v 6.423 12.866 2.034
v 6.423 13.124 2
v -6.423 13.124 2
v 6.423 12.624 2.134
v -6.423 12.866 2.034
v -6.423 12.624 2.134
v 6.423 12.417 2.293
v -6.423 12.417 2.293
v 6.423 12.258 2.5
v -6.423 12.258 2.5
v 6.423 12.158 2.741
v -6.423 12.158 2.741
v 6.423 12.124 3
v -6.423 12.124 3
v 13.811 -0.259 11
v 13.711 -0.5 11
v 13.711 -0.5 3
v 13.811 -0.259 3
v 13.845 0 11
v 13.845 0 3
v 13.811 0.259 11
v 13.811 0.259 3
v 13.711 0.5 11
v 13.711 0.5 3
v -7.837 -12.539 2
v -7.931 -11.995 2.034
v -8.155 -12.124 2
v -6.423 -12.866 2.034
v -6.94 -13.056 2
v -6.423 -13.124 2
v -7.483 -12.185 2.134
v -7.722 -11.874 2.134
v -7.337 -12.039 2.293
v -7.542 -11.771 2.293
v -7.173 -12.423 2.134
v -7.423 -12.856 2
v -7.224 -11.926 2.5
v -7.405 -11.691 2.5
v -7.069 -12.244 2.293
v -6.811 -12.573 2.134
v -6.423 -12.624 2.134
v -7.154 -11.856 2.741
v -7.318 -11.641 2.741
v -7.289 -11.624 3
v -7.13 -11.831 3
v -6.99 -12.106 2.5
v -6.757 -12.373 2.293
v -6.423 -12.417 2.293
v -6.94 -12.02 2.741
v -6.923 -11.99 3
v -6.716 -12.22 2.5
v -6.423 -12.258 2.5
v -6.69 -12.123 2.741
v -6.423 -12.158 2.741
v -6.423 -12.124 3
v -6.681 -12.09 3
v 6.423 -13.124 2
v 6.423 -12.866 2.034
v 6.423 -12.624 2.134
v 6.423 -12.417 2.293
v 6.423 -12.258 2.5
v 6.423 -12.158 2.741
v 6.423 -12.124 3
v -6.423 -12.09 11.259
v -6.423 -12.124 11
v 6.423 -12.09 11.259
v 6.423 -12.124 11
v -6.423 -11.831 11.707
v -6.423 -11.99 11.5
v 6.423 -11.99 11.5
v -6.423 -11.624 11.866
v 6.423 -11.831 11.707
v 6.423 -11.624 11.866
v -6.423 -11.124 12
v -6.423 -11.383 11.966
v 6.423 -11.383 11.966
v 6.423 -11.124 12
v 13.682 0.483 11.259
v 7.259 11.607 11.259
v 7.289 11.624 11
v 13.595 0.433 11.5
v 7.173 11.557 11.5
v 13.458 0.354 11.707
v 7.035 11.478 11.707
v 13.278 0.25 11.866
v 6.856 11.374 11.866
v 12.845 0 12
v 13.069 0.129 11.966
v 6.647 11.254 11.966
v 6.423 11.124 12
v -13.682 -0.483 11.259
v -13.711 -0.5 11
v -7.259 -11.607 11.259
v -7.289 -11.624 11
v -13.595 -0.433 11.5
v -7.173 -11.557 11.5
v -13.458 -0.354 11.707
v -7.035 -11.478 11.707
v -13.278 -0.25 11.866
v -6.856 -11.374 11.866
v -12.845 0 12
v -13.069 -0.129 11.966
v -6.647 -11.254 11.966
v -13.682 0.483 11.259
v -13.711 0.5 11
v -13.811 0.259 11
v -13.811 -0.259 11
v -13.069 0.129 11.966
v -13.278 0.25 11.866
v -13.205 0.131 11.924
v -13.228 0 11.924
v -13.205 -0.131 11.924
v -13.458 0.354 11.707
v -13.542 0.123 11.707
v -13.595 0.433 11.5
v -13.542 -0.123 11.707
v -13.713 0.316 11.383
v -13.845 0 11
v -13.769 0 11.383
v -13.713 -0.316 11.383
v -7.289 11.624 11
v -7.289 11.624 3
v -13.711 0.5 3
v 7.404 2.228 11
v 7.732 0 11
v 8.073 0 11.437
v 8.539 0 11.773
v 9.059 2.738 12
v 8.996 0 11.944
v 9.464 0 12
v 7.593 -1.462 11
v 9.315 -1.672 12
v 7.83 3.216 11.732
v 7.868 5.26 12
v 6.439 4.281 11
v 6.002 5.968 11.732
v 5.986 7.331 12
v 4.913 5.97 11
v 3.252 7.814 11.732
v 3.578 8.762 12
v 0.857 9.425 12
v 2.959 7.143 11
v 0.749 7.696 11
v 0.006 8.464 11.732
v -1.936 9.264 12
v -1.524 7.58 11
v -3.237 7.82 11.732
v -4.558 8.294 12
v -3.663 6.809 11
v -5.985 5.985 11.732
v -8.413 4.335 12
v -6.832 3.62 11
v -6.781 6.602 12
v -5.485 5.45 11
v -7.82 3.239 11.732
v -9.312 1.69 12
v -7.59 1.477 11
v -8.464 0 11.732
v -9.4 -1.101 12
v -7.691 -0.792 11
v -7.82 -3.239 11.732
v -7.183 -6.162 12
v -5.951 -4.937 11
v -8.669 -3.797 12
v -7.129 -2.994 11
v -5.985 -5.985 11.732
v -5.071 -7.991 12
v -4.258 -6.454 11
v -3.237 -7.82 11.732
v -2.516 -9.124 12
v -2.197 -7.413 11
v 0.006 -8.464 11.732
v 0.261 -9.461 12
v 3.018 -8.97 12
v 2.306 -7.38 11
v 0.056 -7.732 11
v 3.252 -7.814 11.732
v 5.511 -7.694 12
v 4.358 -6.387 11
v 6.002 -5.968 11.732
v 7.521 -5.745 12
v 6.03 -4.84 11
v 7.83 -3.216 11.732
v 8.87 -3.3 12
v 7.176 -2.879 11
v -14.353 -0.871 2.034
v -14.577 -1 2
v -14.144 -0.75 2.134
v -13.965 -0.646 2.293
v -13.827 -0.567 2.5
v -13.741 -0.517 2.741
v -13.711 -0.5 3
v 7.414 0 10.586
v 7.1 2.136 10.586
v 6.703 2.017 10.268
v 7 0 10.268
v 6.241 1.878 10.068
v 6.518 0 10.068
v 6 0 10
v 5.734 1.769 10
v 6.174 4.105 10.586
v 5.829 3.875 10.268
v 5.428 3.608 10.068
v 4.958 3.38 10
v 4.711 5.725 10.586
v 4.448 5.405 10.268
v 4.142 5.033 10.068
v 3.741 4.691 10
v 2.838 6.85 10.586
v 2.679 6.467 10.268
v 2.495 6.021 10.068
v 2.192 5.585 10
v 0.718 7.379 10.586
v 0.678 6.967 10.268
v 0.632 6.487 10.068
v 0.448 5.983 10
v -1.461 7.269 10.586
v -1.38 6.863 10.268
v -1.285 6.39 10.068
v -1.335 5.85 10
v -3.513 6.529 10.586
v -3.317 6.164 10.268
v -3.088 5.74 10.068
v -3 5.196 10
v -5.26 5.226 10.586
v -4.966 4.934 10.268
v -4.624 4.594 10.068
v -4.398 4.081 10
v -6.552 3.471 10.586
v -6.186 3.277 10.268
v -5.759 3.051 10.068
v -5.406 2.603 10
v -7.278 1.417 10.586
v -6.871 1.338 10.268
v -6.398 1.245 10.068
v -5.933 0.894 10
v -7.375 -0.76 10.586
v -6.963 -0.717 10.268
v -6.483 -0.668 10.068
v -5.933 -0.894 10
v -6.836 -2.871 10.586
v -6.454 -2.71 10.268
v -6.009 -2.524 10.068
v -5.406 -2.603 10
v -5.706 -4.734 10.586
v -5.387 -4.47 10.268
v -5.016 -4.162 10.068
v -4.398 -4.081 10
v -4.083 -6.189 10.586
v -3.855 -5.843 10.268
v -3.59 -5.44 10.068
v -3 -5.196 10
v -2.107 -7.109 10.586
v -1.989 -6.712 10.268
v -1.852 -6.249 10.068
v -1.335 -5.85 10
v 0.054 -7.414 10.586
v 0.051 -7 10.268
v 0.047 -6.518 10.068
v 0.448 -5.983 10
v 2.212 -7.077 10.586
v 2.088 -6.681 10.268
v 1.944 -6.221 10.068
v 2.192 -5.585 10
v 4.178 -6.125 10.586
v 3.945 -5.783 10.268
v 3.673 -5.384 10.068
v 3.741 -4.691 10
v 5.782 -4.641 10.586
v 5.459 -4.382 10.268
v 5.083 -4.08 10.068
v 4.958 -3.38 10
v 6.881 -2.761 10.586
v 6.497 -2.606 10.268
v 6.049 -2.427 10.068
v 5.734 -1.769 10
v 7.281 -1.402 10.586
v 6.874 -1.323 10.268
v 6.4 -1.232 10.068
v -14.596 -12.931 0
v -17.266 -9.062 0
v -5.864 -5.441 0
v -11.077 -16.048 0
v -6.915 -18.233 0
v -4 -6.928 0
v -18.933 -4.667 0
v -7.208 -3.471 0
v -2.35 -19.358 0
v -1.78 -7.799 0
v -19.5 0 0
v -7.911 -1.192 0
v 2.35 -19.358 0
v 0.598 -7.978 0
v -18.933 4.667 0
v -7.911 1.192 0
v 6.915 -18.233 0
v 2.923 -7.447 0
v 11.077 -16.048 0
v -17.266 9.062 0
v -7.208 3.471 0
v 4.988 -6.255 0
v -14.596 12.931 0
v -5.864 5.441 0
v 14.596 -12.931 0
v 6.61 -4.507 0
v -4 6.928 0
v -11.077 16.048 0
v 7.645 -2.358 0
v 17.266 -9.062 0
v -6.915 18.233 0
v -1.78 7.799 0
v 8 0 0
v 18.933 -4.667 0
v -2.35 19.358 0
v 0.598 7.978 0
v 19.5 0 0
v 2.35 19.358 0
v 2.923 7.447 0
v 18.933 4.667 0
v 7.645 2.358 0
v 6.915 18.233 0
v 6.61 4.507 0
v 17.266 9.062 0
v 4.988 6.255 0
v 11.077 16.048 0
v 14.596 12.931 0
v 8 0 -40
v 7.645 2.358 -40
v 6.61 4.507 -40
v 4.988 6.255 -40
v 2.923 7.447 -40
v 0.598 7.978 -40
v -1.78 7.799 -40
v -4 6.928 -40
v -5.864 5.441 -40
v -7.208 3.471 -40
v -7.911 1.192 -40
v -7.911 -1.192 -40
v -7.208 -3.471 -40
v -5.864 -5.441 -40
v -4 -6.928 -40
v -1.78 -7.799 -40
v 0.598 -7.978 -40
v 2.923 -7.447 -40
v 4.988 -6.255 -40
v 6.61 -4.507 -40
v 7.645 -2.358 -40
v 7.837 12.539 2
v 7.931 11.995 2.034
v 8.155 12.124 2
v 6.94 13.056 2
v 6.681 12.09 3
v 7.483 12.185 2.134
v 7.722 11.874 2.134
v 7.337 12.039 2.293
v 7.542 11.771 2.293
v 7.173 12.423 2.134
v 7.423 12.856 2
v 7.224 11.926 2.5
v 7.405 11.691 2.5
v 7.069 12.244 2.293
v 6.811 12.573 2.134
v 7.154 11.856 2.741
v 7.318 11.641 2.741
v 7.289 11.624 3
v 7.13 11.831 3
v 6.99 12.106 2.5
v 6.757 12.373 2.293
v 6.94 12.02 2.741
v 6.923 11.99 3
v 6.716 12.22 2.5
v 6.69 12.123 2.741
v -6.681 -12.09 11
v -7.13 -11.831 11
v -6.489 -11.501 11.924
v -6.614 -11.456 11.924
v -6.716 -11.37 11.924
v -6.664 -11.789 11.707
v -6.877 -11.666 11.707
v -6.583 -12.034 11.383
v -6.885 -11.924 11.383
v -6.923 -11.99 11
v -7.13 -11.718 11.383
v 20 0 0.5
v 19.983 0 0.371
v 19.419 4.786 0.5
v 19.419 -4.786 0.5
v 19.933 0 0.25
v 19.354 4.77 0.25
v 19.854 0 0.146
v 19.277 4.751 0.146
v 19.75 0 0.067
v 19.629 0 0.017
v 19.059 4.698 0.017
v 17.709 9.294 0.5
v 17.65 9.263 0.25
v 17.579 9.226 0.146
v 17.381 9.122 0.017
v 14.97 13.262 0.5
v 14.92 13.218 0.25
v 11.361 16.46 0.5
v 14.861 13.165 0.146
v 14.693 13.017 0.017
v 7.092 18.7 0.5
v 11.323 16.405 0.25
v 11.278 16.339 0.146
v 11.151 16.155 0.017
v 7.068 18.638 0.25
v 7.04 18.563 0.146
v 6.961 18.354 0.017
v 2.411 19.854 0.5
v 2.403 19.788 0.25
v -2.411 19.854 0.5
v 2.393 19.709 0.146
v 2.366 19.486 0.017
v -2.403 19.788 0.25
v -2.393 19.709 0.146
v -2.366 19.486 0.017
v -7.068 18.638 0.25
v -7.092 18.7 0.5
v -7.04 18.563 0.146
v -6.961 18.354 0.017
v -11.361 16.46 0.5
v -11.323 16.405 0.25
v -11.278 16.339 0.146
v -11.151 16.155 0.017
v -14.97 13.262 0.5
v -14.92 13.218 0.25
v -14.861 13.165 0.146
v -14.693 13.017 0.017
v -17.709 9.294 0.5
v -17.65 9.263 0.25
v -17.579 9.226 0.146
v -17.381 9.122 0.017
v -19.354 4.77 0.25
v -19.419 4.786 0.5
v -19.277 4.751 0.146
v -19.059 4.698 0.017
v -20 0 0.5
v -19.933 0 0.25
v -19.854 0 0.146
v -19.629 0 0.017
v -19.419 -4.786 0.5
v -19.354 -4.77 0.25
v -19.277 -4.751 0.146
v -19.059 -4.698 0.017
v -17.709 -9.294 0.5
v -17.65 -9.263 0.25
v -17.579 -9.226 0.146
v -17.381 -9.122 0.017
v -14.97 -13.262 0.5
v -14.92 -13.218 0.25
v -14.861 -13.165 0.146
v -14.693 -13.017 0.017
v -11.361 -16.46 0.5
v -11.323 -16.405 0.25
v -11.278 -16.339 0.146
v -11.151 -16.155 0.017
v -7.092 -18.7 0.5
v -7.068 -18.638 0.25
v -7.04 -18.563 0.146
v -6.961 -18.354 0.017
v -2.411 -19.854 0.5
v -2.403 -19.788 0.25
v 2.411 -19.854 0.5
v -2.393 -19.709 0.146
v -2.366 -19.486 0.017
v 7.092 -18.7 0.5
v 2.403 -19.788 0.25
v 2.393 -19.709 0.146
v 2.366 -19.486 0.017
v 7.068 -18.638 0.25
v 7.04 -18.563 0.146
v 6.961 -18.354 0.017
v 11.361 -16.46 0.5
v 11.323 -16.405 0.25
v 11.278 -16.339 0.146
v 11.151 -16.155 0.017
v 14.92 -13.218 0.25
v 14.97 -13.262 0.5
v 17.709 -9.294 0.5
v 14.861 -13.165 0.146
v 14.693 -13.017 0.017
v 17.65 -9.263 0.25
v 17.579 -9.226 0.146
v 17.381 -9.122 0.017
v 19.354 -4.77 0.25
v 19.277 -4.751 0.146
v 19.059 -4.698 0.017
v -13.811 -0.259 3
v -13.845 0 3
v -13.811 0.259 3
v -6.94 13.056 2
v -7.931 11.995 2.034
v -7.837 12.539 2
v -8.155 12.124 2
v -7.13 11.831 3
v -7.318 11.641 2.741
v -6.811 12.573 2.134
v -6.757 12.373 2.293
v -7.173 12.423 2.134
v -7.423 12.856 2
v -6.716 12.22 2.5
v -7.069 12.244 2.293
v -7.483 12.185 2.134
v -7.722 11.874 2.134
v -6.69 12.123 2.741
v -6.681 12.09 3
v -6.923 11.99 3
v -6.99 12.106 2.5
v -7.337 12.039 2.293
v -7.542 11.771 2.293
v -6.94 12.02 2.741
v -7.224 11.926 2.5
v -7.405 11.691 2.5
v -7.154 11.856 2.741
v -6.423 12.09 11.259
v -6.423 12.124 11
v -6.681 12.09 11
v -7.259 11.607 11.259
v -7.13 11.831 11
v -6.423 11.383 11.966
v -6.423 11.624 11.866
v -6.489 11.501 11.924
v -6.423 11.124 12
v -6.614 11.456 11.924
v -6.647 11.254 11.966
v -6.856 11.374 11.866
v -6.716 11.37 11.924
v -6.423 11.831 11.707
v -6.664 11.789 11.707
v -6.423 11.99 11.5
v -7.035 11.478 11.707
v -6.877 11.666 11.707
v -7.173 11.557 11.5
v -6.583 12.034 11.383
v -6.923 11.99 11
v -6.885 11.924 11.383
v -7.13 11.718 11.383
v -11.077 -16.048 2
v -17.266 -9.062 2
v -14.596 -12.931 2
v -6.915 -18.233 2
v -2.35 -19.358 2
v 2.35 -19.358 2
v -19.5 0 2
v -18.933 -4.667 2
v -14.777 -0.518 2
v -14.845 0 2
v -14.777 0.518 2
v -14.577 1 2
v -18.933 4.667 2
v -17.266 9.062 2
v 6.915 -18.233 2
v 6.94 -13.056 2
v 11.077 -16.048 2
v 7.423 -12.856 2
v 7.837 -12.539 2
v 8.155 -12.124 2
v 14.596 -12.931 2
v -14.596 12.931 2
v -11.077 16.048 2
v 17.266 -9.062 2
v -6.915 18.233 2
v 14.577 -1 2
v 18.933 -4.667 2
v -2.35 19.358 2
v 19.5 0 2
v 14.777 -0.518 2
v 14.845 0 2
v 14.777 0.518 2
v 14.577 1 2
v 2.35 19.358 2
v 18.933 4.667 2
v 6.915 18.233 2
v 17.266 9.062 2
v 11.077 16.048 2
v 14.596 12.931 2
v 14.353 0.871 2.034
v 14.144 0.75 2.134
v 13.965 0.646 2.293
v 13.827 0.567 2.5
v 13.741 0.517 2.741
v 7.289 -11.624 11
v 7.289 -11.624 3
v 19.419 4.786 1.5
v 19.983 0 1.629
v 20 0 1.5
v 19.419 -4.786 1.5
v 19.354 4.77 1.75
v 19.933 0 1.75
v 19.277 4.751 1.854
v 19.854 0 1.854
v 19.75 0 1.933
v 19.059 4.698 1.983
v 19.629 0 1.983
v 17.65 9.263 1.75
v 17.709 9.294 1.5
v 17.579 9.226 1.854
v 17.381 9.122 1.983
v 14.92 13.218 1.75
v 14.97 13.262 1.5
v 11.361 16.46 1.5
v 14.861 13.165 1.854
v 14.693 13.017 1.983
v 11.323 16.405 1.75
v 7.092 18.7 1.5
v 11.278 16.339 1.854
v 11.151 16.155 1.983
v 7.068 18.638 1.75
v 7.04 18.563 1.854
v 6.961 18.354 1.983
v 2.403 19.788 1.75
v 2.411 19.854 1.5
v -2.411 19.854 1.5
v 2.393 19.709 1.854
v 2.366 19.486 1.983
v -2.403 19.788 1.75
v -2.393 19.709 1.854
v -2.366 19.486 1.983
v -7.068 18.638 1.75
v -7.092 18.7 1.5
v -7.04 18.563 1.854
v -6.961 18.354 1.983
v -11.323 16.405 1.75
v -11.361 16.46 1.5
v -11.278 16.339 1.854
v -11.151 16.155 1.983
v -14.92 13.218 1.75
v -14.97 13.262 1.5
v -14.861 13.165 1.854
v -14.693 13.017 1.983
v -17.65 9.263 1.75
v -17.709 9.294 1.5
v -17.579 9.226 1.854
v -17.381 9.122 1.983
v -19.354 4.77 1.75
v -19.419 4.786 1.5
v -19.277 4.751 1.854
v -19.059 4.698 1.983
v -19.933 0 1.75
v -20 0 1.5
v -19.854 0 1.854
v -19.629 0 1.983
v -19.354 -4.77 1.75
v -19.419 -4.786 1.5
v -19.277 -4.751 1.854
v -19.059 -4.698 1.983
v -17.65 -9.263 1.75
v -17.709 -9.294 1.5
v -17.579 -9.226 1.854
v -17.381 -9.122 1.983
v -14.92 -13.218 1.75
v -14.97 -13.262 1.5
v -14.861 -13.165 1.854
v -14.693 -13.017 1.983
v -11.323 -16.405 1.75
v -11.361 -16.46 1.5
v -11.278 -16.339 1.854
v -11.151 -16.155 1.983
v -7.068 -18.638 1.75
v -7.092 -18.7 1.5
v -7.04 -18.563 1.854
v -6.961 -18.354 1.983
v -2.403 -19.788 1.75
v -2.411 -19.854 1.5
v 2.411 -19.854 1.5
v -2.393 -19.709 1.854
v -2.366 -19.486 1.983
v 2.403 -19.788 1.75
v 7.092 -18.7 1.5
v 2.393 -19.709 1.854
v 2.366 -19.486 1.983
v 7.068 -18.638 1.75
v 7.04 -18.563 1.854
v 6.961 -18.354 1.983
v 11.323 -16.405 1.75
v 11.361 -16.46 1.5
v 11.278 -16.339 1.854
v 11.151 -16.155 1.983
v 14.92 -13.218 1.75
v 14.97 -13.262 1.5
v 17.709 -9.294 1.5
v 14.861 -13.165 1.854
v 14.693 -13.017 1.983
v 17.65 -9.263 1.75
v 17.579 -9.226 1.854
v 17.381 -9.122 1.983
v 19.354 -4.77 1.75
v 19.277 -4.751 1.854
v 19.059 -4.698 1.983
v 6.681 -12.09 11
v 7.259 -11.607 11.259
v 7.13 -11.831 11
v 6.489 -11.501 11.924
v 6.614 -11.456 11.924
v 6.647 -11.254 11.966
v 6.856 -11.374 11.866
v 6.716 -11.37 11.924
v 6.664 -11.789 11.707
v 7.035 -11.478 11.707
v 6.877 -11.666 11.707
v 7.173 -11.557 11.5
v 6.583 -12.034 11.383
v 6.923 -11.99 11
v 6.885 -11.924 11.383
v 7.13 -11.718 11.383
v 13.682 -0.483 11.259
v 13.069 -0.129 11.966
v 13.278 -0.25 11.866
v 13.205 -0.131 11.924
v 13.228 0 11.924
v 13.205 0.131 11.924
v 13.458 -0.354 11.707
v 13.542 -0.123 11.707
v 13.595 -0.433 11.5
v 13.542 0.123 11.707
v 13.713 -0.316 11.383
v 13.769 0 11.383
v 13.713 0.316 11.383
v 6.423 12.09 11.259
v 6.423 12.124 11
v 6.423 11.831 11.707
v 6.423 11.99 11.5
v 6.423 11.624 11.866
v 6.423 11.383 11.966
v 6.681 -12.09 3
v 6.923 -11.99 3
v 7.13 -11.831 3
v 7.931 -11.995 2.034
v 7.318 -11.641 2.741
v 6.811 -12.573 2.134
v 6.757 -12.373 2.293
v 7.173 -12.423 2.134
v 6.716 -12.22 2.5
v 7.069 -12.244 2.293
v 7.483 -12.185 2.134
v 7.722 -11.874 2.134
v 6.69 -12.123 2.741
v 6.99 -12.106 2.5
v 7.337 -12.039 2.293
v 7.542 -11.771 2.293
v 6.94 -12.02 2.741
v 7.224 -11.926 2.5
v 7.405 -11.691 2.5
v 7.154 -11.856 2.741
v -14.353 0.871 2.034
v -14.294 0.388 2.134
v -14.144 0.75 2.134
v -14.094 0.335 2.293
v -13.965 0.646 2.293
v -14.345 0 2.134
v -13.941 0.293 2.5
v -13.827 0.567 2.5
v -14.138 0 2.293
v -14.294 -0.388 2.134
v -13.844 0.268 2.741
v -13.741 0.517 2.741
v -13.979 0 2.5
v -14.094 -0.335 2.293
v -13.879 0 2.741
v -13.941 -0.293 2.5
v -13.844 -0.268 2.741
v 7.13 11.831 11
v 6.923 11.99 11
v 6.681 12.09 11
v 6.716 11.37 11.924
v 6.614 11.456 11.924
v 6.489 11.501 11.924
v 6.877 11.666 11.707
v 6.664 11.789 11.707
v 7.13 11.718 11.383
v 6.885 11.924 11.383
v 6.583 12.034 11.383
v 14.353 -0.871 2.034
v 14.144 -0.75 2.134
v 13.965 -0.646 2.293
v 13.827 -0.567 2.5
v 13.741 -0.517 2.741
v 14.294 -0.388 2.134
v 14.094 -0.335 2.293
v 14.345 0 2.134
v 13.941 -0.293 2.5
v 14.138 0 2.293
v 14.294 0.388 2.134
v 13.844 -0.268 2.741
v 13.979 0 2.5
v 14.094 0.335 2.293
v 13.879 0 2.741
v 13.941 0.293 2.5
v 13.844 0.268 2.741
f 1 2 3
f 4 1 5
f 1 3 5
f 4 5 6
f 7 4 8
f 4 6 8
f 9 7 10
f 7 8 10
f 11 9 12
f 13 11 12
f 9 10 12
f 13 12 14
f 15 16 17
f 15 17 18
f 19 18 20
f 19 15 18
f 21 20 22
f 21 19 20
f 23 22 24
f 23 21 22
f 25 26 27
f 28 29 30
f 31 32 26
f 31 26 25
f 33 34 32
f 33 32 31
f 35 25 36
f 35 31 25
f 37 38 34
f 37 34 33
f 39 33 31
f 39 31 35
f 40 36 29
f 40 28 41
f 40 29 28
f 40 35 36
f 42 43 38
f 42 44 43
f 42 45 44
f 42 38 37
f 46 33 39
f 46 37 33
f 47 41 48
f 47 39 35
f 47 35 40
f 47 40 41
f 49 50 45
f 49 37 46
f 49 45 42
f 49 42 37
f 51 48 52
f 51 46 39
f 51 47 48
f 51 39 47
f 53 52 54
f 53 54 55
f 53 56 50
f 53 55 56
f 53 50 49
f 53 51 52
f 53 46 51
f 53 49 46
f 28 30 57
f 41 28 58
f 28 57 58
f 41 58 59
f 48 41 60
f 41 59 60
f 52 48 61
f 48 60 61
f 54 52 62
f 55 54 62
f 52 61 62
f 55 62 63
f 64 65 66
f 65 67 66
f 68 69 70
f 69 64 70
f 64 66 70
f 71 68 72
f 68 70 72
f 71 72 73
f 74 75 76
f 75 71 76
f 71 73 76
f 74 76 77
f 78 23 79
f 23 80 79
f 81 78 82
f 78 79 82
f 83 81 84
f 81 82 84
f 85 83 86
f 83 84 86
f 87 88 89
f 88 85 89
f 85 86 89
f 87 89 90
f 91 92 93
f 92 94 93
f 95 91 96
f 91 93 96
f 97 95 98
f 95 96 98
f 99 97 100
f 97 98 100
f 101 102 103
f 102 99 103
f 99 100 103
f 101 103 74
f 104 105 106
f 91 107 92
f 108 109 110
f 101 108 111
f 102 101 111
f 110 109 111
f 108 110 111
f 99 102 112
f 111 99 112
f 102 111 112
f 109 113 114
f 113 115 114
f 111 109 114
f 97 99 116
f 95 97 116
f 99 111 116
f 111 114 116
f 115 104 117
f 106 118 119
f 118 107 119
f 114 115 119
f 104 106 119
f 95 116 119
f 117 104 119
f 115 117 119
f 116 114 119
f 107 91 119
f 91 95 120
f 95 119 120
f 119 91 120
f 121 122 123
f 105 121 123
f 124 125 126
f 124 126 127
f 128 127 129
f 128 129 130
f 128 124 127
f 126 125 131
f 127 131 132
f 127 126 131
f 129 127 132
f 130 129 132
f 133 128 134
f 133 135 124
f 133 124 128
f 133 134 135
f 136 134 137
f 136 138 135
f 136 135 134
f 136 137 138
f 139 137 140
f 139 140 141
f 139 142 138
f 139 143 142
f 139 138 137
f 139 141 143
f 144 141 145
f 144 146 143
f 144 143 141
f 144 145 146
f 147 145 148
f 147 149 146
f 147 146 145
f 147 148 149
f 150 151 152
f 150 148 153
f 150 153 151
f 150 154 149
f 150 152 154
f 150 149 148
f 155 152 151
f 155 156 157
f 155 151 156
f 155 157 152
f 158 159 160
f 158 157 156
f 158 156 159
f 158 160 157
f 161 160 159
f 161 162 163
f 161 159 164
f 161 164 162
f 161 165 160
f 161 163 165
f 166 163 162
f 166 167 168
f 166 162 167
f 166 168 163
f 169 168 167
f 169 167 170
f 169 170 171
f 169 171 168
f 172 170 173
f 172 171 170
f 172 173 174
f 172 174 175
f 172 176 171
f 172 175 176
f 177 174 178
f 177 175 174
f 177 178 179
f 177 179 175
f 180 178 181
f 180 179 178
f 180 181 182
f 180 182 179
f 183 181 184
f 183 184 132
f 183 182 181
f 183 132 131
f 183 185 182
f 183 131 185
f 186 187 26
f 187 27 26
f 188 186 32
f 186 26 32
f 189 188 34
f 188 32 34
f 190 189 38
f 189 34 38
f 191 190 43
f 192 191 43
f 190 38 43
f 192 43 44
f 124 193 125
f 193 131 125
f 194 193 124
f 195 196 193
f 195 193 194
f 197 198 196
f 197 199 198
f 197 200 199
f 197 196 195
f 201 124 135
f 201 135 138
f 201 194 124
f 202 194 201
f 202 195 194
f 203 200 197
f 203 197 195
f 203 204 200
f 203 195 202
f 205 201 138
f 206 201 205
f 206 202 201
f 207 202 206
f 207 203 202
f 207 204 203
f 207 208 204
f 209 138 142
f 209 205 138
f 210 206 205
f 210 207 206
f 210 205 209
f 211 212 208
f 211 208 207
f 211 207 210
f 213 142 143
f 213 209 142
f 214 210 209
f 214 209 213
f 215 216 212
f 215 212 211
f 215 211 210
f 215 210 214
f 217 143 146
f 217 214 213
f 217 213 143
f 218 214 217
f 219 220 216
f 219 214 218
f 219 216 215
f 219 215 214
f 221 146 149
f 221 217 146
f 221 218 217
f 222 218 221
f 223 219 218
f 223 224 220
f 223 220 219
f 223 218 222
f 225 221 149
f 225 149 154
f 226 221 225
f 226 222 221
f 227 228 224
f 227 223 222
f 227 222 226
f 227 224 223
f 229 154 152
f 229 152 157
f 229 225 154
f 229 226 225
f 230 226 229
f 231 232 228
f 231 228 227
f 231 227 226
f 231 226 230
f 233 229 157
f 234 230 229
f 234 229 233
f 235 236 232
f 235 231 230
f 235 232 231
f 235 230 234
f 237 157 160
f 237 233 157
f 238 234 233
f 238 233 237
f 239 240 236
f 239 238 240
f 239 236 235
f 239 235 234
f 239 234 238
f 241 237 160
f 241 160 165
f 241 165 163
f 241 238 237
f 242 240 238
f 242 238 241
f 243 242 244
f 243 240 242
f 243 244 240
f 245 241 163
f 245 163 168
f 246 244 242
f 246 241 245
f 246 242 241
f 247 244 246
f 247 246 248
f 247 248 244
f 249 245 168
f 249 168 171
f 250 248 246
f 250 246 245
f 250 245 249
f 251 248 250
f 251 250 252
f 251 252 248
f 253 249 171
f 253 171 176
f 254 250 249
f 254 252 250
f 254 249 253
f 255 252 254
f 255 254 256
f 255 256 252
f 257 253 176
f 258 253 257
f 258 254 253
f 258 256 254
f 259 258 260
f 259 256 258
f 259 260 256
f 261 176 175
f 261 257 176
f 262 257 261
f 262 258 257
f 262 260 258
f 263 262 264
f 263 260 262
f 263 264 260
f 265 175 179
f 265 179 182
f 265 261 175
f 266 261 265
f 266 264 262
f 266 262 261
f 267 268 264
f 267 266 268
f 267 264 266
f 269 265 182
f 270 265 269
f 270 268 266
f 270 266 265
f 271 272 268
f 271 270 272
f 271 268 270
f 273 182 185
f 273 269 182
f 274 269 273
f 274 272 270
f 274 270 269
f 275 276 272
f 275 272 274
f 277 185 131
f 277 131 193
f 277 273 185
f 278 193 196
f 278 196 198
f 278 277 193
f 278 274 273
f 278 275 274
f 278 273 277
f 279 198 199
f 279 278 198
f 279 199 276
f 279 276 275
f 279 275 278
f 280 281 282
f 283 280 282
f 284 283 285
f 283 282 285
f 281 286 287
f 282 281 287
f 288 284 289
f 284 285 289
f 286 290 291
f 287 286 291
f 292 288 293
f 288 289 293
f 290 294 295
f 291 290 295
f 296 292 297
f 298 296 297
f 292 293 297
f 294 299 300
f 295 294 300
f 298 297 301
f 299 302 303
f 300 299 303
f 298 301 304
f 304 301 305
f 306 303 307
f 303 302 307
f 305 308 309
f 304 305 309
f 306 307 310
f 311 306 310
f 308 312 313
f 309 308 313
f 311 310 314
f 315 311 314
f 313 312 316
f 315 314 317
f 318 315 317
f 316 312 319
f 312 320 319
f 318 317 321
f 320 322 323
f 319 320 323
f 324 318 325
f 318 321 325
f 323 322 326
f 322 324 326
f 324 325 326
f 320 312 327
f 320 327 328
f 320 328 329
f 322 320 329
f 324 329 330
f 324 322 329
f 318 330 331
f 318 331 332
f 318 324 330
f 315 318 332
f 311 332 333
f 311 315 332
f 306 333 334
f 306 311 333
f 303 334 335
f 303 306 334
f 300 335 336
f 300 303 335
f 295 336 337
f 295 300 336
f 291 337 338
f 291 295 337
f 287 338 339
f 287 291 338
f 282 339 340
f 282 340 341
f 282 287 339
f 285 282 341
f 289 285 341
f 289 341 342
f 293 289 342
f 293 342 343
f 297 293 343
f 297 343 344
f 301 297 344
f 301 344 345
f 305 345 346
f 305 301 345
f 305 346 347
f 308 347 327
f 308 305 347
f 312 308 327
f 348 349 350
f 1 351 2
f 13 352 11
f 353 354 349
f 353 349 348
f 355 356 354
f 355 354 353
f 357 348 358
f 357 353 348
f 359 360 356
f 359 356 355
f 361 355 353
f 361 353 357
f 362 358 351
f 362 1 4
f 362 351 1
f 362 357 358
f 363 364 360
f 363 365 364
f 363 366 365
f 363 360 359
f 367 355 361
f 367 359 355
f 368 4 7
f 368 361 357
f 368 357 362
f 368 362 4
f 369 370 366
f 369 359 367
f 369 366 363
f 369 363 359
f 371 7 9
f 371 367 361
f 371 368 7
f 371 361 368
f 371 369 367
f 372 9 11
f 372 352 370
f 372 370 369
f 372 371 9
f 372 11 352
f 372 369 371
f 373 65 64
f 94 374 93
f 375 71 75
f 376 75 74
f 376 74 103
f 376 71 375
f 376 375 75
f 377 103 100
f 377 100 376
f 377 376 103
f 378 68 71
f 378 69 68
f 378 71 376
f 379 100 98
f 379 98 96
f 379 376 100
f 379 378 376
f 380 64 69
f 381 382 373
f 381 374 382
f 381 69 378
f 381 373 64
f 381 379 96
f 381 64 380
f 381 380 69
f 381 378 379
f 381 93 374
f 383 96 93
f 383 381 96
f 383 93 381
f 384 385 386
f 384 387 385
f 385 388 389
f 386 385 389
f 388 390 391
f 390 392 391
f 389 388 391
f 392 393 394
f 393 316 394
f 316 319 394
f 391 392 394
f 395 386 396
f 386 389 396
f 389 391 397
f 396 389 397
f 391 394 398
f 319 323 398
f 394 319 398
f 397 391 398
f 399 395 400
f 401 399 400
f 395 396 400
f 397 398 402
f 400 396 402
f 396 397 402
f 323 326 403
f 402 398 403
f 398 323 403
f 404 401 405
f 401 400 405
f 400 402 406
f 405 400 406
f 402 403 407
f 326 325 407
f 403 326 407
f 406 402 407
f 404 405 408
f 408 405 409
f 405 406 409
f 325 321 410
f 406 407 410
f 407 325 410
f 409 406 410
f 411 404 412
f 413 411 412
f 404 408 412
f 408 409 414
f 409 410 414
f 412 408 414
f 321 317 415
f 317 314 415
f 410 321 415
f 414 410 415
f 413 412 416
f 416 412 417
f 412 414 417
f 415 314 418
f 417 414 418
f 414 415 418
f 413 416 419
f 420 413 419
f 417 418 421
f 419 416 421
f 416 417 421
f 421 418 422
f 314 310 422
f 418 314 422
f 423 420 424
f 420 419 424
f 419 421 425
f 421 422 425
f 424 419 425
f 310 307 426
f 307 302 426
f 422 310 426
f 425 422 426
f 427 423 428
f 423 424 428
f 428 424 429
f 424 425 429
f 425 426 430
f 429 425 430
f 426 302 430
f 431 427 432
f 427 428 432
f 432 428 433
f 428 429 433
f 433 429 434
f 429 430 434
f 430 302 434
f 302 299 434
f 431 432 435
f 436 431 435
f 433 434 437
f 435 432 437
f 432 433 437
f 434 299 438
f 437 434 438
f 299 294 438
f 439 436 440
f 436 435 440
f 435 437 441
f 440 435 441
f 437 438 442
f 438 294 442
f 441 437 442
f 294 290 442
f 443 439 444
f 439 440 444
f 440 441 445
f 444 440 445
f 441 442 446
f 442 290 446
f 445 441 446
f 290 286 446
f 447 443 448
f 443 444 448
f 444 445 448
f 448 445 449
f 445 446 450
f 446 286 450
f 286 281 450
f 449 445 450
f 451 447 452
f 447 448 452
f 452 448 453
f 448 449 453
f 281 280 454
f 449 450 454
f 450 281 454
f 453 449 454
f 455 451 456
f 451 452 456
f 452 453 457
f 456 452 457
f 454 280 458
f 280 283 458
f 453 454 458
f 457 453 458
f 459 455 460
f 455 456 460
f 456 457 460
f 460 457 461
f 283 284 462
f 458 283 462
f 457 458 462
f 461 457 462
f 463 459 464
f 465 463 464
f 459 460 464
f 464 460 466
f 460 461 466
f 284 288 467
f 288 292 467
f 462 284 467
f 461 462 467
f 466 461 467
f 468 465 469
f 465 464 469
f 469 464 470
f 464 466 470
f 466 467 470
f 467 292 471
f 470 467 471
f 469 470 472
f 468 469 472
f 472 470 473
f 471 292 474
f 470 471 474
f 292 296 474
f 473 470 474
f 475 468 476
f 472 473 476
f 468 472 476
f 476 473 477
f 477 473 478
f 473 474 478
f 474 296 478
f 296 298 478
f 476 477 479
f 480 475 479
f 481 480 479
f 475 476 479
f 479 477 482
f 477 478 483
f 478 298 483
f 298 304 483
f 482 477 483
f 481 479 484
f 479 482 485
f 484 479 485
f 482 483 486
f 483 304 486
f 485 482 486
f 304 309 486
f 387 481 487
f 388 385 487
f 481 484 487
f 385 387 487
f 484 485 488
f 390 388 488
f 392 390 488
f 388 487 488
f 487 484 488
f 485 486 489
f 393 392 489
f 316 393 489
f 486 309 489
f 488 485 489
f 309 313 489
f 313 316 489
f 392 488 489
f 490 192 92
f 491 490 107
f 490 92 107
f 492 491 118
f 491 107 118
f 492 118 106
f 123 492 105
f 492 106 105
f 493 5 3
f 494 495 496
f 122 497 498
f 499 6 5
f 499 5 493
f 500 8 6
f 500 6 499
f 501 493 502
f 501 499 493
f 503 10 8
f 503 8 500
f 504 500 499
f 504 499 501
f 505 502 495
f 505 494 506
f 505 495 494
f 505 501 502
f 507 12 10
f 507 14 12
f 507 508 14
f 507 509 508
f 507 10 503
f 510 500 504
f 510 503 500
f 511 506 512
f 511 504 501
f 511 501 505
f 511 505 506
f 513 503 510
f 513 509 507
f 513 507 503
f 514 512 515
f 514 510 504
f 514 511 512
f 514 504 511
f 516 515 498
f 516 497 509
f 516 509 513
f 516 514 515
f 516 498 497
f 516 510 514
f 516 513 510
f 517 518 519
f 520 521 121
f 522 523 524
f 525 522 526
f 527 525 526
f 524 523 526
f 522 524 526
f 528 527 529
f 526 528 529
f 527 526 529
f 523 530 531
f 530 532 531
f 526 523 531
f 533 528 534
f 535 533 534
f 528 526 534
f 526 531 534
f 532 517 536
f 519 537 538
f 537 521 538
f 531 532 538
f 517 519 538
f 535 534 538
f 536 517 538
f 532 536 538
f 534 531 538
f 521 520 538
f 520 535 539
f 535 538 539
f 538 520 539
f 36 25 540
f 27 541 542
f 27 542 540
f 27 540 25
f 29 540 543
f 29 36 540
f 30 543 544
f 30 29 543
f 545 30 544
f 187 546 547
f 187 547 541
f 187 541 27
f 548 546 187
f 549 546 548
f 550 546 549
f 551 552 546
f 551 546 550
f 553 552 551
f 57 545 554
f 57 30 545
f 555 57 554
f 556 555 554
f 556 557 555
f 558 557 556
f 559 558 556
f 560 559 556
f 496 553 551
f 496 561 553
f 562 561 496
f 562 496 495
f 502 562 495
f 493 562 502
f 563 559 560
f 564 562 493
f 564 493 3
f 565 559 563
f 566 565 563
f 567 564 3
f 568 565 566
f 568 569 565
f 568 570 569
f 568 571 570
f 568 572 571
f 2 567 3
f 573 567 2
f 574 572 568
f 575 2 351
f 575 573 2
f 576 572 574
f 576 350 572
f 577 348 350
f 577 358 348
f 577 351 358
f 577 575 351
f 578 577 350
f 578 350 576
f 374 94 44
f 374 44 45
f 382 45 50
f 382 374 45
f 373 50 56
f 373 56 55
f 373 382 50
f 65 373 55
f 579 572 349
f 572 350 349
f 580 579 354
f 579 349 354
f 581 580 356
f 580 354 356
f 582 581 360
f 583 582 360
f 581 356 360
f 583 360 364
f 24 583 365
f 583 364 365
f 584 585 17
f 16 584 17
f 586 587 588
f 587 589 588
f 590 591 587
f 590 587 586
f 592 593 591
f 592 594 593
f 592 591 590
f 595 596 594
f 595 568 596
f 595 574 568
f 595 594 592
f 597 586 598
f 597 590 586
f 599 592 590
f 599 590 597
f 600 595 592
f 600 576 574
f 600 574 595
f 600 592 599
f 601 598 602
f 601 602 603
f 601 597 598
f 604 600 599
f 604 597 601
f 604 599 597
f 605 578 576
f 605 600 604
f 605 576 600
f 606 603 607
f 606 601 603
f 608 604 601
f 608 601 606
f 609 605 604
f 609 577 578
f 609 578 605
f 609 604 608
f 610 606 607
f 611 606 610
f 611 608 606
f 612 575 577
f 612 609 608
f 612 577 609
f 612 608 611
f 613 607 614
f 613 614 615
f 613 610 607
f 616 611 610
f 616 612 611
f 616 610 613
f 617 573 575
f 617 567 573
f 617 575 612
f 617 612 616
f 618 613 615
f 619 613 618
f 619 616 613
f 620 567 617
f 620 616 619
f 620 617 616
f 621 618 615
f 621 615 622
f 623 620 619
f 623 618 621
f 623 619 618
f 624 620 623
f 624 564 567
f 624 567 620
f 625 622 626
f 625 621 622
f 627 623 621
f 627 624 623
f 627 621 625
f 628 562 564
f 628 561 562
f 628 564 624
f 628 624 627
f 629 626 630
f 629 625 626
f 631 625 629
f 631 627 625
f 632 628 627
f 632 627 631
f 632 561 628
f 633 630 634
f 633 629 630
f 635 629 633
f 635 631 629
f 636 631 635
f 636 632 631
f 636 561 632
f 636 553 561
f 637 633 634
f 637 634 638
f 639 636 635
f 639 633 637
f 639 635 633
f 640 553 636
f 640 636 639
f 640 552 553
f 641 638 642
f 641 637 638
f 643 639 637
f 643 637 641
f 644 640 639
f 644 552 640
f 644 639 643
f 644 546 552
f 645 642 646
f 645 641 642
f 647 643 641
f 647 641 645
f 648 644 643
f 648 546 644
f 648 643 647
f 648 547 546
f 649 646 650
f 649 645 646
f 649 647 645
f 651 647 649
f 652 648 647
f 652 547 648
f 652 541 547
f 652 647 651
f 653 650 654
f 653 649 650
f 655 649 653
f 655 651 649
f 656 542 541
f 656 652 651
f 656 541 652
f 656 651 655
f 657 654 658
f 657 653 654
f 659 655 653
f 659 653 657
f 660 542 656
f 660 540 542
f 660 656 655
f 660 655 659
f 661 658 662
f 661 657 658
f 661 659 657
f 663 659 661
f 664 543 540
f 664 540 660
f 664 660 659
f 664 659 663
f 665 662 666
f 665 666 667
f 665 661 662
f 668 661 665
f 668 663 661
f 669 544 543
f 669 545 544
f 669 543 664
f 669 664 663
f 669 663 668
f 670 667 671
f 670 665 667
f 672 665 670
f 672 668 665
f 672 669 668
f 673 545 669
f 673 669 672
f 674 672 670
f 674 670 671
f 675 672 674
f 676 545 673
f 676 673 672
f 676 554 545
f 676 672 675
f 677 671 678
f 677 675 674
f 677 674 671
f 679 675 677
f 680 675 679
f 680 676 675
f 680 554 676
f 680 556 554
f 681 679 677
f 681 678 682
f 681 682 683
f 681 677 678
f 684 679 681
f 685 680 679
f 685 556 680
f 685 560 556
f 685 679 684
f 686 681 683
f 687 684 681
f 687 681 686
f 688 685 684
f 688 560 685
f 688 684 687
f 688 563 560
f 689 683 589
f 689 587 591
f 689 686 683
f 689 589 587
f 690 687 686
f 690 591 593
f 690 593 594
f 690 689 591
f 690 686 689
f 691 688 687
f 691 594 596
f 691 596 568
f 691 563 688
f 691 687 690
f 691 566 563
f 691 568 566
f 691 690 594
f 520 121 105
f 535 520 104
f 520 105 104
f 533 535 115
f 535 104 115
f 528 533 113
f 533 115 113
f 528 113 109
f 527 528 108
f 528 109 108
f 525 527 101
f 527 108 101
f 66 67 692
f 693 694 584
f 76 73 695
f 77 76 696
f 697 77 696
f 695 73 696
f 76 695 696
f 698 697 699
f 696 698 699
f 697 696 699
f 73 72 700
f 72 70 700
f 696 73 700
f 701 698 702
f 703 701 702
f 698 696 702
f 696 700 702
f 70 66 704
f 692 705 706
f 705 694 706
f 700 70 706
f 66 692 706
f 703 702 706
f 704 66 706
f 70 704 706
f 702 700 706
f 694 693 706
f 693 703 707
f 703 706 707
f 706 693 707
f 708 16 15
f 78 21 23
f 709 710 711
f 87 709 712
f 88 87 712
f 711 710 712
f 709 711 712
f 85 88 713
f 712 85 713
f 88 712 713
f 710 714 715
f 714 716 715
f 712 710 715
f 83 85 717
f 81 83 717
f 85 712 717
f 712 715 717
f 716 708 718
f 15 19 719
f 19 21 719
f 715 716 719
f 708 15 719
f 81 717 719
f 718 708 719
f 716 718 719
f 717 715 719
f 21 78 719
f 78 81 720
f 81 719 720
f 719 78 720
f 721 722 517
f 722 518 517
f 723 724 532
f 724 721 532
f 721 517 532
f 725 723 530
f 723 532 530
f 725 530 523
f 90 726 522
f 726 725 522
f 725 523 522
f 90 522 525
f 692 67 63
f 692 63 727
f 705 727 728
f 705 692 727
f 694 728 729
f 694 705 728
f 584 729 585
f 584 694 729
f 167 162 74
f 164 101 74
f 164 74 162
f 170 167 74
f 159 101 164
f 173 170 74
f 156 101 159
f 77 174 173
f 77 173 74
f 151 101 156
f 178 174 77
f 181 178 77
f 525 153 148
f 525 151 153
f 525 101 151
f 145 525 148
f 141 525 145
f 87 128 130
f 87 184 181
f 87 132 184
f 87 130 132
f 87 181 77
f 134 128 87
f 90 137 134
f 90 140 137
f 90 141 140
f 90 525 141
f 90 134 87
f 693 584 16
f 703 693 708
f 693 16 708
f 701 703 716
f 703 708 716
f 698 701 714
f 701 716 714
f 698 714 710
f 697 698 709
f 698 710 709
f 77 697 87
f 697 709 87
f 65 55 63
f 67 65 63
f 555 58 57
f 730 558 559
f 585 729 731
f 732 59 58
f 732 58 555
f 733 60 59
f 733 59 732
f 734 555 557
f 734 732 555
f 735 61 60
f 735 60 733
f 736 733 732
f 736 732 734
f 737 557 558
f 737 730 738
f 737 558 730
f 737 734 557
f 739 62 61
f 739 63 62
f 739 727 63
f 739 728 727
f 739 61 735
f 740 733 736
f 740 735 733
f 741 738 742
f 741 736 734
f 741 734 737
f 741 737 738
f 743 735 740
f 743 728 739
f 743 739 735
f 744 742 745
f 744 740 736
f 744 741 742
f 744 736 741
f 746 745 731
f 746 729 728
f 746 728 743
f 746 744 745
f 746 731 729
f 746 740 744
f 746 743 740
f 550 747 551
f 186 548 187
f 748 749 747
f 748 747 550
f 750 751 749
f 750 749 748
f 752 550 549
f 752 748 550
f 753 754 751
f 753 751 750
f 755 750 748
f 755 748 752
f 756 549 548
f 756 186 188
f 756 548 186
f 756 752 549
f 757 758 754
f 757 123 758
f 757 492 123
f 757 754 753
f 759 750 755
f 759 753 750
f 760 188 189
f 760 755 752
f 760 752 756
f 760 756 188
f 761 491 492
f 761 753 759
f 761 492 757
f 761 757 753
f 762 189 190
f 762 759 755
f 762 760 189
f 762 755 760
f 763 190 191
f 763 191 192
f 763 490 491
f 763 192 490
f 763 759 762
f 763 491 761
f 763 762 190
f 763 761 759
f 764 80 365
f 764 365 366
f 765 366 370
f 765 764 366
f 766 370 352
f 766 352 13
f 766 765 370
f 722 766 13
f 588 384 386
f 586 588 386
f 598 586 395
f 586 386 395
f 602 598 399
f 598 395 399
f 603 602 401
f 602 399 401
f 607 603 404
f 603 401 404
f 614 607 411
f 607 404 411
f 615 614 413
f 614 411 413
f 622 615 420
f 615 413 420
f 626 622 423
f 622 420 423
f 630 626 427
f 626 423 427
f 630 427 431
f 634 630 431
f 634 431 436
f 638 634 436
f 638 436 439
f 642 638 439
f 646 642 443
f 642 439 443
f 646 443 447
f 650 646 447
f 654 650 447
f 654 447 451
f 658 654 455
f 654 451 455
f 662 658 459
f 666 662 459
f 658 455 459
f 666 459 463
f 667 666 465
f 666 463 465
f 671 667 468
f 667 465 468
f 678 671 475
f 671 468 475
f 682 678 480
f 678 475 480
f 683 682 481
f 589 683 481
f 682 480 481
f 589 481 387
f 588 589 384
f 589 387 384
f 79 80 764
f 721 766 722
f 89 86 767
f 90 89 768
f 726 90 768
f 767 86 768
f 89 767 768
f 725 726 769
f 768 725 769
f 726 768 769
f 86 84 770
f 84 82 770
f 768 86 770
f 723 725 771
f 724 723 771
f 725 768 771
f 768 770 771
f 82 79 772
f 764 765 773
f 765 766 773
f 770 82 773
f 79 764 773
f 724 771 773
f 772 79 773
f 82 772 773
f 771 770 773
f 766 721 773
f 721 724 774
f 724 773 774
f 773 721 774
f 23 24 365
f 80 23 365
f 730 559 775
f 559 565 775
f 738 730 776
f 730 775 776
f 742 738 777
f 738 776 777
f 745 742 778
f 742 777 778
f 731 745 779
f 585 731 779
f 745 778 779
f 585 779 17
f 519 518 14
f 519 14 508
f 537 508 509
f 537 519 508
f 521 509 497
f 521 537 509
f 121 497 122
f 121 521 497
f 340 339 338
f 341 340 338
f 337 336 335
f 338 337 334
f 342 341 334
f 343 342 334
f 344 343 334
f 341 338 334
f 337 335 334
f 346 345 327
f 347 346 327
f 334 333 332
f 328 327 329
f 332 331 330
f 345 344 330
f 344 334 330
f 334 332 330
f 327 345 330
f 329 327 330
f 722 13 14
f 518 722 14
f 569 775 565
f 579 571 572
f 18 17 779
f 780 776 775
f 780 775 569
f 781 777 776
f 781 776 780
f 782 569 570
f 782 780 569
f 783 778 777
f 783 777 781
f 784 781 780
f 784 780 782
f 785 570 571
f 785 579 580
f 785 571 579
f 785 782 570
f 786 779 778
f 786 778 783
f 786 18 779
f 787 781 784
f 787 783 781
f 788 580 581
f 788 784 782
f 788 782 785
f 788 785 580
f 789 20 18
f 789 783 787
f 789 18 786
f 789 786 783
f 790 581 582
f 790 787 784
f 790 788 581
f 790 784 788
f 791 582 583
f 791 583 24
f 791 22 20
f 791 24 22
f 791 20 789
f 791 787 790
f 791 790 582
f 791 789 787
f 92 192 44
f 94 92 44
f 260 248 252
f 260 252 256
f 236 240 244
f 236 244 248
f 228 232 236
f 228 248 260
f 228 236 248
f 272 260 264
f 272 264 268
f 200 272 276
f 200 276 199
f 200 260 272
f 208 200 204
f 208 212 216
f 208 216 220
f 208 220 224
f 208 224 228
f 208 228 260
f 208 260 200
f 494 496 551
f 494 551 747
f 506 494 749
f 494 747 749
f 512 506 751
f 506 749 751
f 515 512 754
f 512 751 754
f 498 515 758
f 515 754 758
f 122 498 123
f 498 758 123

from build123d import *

# Parameters (mm, degrees)
SKETCH1_R           = 8
BOSS_EXTRUDE1_DEPTH = 40
SKETCH1_3_R         = 20
BOSS_EXTRUDE2_DEPTH = 2
BOSS_EXTRUDE3_DEPTH = 10
CUT_EXTRUDE1_START  = 10
SKETCH2_3_R         = 8
CUT_EXTRUDE1_DEPTH  = 2
FILLET1_R           = 0.5
FILLET2_R           = 1
FILLET3_R           = 2
FILLET4_R           = 2


with BuildPart() as part:
    # Sketch1 → Boss-Extrude1 (new body)
    with BuildSketch(Plane(origin=(0, 0, 0), x_dir=(0, 1, 0), z_dir=(0, 0, 1))):
        with Locations(Location((0, 0, 0), (0, 0, 270))):
            Circle(SKETCH1_R)
    extrude(amount=-BOSS_EXTRUDE1_DEPTH)

    # Sketch1<3> → Boss-Extrude2 (add)
    with BuildSketch(Plane(origin=(0, 0, 0), x_dir=(0, 1, 0), z_dir=(0, 0, 1))):
        with Locations(Location((0, 0, 0), (0, 0, 270))):
            Circle(SKETCH1_3_R)
    extrude(amount=BOSS_EXTRUDE2_DEPTH)

    # Sketch2 → Boss-Extrude3 (add)
    with BuildSketch(Plane.XY.offset(2)):
        Polygon((-14, 0), (-7, -12.124355653), (7, -12.124355653), (14, 0), (7, 12.124355653), (-7, 12.124355653), align=None)
    extrude(amount=BOSS_EXTRUDE3_DEPTH)

    # Sketch2<3> → Cut-Extrude1 (cut)
    with BuildSketch(Plane.XY.offset(2).offset(CUT_EXTRUDE1_START)):
        Circle(SKETCH2_3_R)
    extrude(amount=-CUT_EXTRUDE1_DEPTH, mode=Mode.SUBTRACT)

    # Fillet1
    fillet1_edges = [part.edges().sort_by_distance(p)[0] for p in [
        (-20, 0, 0),
        (-20, 0, 2),
    ]]
    fillet(fillet1_edges, radius=FILLET1_R)

    # Fillet2
    fillet2_edges = [part.edges().sort_by_distance(p)[0] for p in [
        (0, -12.124355653, 2),
        (-7, -12.124355653, 7),
        (10.5, -6.062177826, 2),
        (7, -12.124355653, 7),
        (10.5, 6.062177826, 2),
        (14, 0, 7),
        (0, 12.124355653, 2),
        (7, 12.124355653, 7),
        (-10.5, 6.062177826, 2),
        (-7, 12.124355653, 7),
        (-10.5, -6.062177826, 2),
        (-14, 0, 7),
        (0, -12.124355653, 12),
        (10.5, -6.062177826, 12),
        (10.5, 6.062177826, 12),
        (0, 12.124355653, 12),
        (-10.5, 6.062177826, 12),
        (-10.5, -6.062177826, 12),
    ]]
    fillet(fillet2_edges, radius=FILLET2_R)

    # Fillet3
    fillet3_edges = [part.edges().sort_by_distance(p)[0] for p in [
        (-8, 0, 10),
    ]]
    fillet(fillet3_edges, radius=FILLET3_R - 0.0001)  # a hair under: the kernel refuses the full size

    # Fillet4
    fillet4_edges = [part.edges().sort_by_distance(p)[0] for p in [
        (-8, 0, 12),
    ]]
    fillet(fillet4_edges, radius=FILLET4_R)


solid = part.part
